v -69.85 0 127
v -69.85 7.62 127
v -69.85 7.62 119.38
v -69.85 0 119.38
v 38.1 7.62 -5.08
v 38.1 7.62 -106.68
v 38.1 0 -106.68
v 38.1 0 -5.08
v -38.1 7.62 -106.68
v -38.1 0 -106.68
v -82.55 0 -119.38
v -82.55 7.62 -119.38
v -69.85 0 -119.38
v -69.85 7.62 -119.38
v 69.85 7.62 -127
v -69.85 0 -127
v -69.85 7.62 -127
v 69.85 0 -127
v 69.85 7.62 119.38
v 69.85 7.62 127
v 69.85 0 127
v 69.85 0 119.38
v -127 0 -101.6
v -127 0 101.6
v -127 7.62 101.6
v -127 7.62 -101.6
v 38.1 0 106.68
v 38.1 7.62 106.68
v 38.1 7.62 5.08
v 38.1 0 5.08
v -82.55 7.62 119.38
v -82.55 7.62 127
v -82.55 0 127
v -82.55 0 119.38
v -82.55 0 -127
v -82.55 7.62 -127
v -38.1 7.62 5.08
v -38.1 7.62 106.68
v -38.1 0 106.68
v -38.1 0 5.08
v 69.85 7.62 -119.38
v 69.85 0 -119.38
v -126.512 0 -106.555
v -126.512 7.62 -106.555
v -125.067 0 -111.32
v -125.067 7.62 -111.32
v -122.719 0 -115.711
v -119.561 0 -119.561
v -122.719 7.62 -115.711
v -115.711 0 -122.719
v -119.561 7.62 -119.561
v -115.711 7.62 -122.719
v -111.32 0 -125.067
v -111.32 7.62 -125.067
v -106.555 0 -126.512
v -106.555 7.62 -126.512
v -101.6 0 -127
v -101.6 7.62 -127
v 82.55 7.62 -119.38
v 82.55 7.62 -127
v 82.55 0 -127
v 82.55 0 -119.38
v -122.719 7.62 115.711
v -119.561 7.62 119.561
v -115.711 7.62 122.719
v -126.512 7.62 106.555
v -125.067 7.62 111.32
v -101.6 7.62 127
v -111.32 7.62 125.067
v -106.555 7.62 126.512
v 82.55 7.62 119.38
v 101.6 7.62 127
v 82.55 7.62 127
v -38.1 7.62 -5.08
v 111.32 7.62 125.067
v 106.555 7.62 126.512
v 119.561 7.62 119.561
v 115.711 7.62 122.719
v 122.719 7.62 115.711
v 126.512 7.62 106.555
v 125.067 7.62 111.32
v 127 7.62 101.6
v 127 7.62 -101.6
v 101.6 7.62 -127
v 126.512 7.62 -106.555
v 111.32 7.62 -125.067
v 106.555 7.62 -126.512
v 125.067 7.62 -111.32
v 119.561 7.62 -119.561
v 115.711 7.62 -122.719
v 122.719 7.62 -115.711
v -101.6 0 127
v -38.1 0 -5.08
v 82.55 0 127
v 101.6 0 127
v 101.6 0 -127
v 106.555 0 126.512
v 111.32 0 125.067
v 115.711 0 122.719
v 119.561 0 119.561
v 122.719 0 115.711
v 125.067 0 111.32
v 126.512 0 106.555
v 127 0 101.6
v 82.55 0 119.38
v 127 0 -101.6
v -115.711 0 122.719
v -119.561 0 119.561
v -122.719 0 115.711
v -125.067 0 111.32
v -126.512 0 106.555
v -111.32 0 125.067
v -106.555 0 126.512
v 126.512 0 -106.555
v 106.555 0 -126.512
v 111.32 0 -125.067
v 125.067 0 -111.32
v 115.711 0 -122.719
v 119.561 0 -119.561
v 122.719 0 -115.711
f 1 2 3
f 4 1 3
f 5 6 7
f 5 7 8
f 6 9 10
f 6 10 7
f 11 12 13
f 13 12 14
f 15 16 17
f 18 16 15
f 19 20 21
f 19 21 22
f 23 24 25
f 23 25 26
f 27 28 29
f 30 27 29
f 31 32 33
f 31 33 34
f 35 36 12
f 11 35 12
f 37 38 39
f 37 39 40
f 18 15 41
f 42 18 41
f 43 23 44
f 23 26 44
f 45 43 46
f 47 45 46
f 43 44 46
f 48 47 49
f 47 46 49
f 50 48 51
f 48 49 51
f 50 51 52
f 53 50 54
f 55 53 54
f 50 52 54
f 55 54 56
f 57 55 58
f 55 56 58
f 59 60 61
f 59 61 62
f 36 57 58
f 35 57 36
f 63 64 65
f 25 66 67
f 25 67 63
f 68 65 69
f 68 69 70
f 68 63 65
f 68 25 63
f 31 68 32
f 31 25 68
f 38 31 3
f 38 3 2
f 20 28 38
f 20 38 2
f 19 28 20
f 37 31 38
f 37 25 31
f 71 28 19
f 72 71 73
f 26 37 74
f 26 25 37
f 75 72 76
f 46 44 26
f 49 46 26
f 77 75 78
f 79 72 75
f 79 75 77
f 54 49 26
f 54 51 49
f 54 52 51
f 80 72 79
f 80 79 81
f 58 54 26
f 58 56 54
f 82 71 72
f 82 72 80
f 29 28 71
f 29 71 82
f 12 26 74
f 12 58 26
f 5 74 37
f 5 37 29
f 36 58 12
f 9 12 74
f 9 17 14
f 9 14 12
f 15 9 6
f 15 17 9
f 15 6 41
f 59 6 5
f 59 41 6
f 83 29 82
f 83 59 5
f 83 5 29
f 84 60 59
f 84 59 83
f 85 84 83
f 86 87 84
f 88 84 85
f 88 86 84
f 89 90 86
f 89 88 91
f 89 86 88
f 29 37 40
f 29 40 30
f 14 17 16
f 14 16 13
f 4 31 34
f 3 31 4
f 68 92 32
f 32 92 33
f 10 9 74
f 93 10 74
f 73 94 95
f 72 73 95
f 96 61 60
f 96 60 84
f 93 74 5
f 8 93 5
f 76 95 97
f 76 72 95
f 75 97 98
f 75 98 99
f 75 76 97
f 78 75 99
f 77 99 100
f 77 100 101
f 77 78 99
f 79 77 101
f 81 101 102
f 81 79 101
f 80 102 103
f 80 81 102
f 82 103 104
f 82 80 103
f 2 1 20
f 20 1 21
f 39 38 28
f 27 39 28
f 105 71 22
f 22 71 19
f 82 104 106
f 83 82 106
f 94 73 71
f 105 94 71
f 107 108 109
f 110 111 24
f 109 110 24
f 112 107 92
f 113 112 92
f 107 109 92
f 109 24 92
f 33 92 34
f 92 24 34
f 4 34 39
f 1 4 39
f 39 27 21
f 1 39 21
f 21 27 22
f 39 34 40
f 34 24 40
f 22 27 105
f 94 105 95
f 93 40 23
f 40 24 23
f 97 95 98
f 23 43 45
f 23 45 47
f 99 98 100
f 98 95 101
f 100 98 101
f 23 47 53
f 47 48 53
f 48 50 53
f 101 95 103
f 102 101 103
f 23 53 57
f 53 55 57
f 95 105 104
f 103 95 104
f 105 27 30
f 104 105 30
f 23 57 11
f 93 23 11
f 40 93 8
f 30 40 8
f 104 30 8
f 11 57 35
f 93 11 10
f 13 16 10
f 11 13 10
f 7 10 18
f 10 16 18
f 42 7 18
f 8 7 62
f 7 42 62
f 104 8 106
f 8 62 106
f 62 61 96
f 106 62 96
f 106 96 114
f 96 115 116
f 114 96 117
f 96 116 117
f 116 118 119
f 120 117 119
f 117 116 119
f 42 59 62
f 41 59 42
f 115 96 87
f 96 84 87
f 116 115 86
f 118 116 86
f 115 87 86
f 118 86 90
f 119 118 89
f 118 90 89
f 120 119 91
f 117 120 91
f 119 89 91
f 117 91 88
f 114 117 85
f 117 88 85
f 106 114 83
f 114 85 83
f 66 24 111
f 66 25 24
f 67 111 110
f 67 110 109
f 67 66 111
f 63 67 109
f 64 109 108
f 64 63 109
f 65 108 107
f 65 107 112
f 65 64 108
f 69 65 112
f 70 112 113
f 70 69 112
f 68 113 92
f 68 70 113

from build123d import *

# Parameters (mm, degrees)
SKETCH1_W               = 254
SKETCH1_H               = 254
PLATFORM_BASE_DEPTH     = 7.62
SKETCH7_W               = 76.2
SKETCH7_H               = 101.6
CUT_EXTRUDE4_DEPTH      = 180.766694357
CORNER_ROUNDING_R       = 25.4
SKETCH6_W               = 12.7
SKETCH6_H               = 7.62
CUT_EXTRUDE3_DEPTH      = 180.766694357
MIRROR6_COPY_1_SKETCH_W = 12.7
MIRROR6_COPY_1_SKETCH_H = 7.62
MIRROR6_COPY_1_DEPTH    = 180.766694357
MIRROR6_COPY_2_SKETCH_W = 12.7
MIRROR6_COPY_2_SKETCH_H = 7.62
MIRROR6_COPY_2_DEPTH    = 180.766694357


with BuildPart() as part:
    # Sketch1 → Platform-Base (new body)
    with BuildSketch(Plane(origin=(0, 0, 0), x_dir=(1, 0, 0), z_dir=(0, 1, 0))):
        Rectangle(SKETCH1_W, SKETCH1_H)
    extrude(amount=PLATFORM_BASE_DEPTH)

    # Sketch7 → Cut-Extrude4 (cut, through all)
    with BuildSketch(Plane(origin=(0, 7.62, 0), x_dir=(1, 0, 0), z_dir=(0, 1, 0))):
        with Locations((0, -55.88)):
            Rectangle(SKETCH7_W, SKETCH7_H)
    cut_extrude4 = extrude(amount=-CUT_EXTRUDE4_DEPTH, mode=Mode.SUBTRACT)

    # Corner-Rounding
    corner_rounding_edges = [part.edges().sort_by_distance(p)[0] for p in [
        (-127, 3.81, -127),
        (127, 3.81, -127),
        (127, 3.81, 127),
        (-127, 3.81, 127),
    ]]
    fillet(corner_rounding_edges, radius=CORNER_ROUNDING_R)

    # Sketch6 → Cut-Extrude3 (cut, through all)
    with BuildSketch(Plane(origin=(0, 7.62, 0), x_dir=(1, 0, 0), z_dir=(0, 1, 0))):
        with Locations((-76.2, -123.19)):
            Rectangle(SKETCH6_W, SKETCH6_H)
    cut_extrude3 = extrude(amount=-CUT_EXTRUDE3_DEPTH, mode=Mode.SUBTRACT)

    # Mirror4: Cut-Extrude3 across plane
    add(cut_extrude3.mirror(Plane.XY), mode=Mode.SUBTRACT)

    # Mirror5: Cut-Extrude4 across plane
    add(cut_extrude4.mirror(Plane.XY), mode=Mode.SUBTRACT)

    # Mirror6 copy 1 sketch → Mirror6 copy 1 (cut, through all)
    with BuildSketch(Plane(origin=(0, 7.62, 0), x_dir=(-1, 0, 0), z_dir=(0, 1, 0))):
        with Locations((-76.2, -123.19)):
            Rectangle(MIRROR6_COPY_1_SKETCH_W, MIRROR6_COPY_1_SKETCH_H)
    extrude(amount=-MIRROR6_COPY_1_DEPTH, mode=Mode.SUBTRACT)

    # Mirror6 copy 2 sketch → Mirror6 copy 2 (cut, through all)
    with BuildSketch(Plane(origin=(0, 7.62, 0), x_dir=(-1, 0, 0), z_dir=(0, 1, 0))):
        with Locations((-76.2, 123.19)):
            Rectangle(MIRROR6_COPY_2_SKETCH_W, MIRROR6_COPY_2_SKETCH_H)
    extrude(amount=-MIRROR6_COPY_2_DEPTH, mode=Mode.SUBTRACT)


solid = part.part
